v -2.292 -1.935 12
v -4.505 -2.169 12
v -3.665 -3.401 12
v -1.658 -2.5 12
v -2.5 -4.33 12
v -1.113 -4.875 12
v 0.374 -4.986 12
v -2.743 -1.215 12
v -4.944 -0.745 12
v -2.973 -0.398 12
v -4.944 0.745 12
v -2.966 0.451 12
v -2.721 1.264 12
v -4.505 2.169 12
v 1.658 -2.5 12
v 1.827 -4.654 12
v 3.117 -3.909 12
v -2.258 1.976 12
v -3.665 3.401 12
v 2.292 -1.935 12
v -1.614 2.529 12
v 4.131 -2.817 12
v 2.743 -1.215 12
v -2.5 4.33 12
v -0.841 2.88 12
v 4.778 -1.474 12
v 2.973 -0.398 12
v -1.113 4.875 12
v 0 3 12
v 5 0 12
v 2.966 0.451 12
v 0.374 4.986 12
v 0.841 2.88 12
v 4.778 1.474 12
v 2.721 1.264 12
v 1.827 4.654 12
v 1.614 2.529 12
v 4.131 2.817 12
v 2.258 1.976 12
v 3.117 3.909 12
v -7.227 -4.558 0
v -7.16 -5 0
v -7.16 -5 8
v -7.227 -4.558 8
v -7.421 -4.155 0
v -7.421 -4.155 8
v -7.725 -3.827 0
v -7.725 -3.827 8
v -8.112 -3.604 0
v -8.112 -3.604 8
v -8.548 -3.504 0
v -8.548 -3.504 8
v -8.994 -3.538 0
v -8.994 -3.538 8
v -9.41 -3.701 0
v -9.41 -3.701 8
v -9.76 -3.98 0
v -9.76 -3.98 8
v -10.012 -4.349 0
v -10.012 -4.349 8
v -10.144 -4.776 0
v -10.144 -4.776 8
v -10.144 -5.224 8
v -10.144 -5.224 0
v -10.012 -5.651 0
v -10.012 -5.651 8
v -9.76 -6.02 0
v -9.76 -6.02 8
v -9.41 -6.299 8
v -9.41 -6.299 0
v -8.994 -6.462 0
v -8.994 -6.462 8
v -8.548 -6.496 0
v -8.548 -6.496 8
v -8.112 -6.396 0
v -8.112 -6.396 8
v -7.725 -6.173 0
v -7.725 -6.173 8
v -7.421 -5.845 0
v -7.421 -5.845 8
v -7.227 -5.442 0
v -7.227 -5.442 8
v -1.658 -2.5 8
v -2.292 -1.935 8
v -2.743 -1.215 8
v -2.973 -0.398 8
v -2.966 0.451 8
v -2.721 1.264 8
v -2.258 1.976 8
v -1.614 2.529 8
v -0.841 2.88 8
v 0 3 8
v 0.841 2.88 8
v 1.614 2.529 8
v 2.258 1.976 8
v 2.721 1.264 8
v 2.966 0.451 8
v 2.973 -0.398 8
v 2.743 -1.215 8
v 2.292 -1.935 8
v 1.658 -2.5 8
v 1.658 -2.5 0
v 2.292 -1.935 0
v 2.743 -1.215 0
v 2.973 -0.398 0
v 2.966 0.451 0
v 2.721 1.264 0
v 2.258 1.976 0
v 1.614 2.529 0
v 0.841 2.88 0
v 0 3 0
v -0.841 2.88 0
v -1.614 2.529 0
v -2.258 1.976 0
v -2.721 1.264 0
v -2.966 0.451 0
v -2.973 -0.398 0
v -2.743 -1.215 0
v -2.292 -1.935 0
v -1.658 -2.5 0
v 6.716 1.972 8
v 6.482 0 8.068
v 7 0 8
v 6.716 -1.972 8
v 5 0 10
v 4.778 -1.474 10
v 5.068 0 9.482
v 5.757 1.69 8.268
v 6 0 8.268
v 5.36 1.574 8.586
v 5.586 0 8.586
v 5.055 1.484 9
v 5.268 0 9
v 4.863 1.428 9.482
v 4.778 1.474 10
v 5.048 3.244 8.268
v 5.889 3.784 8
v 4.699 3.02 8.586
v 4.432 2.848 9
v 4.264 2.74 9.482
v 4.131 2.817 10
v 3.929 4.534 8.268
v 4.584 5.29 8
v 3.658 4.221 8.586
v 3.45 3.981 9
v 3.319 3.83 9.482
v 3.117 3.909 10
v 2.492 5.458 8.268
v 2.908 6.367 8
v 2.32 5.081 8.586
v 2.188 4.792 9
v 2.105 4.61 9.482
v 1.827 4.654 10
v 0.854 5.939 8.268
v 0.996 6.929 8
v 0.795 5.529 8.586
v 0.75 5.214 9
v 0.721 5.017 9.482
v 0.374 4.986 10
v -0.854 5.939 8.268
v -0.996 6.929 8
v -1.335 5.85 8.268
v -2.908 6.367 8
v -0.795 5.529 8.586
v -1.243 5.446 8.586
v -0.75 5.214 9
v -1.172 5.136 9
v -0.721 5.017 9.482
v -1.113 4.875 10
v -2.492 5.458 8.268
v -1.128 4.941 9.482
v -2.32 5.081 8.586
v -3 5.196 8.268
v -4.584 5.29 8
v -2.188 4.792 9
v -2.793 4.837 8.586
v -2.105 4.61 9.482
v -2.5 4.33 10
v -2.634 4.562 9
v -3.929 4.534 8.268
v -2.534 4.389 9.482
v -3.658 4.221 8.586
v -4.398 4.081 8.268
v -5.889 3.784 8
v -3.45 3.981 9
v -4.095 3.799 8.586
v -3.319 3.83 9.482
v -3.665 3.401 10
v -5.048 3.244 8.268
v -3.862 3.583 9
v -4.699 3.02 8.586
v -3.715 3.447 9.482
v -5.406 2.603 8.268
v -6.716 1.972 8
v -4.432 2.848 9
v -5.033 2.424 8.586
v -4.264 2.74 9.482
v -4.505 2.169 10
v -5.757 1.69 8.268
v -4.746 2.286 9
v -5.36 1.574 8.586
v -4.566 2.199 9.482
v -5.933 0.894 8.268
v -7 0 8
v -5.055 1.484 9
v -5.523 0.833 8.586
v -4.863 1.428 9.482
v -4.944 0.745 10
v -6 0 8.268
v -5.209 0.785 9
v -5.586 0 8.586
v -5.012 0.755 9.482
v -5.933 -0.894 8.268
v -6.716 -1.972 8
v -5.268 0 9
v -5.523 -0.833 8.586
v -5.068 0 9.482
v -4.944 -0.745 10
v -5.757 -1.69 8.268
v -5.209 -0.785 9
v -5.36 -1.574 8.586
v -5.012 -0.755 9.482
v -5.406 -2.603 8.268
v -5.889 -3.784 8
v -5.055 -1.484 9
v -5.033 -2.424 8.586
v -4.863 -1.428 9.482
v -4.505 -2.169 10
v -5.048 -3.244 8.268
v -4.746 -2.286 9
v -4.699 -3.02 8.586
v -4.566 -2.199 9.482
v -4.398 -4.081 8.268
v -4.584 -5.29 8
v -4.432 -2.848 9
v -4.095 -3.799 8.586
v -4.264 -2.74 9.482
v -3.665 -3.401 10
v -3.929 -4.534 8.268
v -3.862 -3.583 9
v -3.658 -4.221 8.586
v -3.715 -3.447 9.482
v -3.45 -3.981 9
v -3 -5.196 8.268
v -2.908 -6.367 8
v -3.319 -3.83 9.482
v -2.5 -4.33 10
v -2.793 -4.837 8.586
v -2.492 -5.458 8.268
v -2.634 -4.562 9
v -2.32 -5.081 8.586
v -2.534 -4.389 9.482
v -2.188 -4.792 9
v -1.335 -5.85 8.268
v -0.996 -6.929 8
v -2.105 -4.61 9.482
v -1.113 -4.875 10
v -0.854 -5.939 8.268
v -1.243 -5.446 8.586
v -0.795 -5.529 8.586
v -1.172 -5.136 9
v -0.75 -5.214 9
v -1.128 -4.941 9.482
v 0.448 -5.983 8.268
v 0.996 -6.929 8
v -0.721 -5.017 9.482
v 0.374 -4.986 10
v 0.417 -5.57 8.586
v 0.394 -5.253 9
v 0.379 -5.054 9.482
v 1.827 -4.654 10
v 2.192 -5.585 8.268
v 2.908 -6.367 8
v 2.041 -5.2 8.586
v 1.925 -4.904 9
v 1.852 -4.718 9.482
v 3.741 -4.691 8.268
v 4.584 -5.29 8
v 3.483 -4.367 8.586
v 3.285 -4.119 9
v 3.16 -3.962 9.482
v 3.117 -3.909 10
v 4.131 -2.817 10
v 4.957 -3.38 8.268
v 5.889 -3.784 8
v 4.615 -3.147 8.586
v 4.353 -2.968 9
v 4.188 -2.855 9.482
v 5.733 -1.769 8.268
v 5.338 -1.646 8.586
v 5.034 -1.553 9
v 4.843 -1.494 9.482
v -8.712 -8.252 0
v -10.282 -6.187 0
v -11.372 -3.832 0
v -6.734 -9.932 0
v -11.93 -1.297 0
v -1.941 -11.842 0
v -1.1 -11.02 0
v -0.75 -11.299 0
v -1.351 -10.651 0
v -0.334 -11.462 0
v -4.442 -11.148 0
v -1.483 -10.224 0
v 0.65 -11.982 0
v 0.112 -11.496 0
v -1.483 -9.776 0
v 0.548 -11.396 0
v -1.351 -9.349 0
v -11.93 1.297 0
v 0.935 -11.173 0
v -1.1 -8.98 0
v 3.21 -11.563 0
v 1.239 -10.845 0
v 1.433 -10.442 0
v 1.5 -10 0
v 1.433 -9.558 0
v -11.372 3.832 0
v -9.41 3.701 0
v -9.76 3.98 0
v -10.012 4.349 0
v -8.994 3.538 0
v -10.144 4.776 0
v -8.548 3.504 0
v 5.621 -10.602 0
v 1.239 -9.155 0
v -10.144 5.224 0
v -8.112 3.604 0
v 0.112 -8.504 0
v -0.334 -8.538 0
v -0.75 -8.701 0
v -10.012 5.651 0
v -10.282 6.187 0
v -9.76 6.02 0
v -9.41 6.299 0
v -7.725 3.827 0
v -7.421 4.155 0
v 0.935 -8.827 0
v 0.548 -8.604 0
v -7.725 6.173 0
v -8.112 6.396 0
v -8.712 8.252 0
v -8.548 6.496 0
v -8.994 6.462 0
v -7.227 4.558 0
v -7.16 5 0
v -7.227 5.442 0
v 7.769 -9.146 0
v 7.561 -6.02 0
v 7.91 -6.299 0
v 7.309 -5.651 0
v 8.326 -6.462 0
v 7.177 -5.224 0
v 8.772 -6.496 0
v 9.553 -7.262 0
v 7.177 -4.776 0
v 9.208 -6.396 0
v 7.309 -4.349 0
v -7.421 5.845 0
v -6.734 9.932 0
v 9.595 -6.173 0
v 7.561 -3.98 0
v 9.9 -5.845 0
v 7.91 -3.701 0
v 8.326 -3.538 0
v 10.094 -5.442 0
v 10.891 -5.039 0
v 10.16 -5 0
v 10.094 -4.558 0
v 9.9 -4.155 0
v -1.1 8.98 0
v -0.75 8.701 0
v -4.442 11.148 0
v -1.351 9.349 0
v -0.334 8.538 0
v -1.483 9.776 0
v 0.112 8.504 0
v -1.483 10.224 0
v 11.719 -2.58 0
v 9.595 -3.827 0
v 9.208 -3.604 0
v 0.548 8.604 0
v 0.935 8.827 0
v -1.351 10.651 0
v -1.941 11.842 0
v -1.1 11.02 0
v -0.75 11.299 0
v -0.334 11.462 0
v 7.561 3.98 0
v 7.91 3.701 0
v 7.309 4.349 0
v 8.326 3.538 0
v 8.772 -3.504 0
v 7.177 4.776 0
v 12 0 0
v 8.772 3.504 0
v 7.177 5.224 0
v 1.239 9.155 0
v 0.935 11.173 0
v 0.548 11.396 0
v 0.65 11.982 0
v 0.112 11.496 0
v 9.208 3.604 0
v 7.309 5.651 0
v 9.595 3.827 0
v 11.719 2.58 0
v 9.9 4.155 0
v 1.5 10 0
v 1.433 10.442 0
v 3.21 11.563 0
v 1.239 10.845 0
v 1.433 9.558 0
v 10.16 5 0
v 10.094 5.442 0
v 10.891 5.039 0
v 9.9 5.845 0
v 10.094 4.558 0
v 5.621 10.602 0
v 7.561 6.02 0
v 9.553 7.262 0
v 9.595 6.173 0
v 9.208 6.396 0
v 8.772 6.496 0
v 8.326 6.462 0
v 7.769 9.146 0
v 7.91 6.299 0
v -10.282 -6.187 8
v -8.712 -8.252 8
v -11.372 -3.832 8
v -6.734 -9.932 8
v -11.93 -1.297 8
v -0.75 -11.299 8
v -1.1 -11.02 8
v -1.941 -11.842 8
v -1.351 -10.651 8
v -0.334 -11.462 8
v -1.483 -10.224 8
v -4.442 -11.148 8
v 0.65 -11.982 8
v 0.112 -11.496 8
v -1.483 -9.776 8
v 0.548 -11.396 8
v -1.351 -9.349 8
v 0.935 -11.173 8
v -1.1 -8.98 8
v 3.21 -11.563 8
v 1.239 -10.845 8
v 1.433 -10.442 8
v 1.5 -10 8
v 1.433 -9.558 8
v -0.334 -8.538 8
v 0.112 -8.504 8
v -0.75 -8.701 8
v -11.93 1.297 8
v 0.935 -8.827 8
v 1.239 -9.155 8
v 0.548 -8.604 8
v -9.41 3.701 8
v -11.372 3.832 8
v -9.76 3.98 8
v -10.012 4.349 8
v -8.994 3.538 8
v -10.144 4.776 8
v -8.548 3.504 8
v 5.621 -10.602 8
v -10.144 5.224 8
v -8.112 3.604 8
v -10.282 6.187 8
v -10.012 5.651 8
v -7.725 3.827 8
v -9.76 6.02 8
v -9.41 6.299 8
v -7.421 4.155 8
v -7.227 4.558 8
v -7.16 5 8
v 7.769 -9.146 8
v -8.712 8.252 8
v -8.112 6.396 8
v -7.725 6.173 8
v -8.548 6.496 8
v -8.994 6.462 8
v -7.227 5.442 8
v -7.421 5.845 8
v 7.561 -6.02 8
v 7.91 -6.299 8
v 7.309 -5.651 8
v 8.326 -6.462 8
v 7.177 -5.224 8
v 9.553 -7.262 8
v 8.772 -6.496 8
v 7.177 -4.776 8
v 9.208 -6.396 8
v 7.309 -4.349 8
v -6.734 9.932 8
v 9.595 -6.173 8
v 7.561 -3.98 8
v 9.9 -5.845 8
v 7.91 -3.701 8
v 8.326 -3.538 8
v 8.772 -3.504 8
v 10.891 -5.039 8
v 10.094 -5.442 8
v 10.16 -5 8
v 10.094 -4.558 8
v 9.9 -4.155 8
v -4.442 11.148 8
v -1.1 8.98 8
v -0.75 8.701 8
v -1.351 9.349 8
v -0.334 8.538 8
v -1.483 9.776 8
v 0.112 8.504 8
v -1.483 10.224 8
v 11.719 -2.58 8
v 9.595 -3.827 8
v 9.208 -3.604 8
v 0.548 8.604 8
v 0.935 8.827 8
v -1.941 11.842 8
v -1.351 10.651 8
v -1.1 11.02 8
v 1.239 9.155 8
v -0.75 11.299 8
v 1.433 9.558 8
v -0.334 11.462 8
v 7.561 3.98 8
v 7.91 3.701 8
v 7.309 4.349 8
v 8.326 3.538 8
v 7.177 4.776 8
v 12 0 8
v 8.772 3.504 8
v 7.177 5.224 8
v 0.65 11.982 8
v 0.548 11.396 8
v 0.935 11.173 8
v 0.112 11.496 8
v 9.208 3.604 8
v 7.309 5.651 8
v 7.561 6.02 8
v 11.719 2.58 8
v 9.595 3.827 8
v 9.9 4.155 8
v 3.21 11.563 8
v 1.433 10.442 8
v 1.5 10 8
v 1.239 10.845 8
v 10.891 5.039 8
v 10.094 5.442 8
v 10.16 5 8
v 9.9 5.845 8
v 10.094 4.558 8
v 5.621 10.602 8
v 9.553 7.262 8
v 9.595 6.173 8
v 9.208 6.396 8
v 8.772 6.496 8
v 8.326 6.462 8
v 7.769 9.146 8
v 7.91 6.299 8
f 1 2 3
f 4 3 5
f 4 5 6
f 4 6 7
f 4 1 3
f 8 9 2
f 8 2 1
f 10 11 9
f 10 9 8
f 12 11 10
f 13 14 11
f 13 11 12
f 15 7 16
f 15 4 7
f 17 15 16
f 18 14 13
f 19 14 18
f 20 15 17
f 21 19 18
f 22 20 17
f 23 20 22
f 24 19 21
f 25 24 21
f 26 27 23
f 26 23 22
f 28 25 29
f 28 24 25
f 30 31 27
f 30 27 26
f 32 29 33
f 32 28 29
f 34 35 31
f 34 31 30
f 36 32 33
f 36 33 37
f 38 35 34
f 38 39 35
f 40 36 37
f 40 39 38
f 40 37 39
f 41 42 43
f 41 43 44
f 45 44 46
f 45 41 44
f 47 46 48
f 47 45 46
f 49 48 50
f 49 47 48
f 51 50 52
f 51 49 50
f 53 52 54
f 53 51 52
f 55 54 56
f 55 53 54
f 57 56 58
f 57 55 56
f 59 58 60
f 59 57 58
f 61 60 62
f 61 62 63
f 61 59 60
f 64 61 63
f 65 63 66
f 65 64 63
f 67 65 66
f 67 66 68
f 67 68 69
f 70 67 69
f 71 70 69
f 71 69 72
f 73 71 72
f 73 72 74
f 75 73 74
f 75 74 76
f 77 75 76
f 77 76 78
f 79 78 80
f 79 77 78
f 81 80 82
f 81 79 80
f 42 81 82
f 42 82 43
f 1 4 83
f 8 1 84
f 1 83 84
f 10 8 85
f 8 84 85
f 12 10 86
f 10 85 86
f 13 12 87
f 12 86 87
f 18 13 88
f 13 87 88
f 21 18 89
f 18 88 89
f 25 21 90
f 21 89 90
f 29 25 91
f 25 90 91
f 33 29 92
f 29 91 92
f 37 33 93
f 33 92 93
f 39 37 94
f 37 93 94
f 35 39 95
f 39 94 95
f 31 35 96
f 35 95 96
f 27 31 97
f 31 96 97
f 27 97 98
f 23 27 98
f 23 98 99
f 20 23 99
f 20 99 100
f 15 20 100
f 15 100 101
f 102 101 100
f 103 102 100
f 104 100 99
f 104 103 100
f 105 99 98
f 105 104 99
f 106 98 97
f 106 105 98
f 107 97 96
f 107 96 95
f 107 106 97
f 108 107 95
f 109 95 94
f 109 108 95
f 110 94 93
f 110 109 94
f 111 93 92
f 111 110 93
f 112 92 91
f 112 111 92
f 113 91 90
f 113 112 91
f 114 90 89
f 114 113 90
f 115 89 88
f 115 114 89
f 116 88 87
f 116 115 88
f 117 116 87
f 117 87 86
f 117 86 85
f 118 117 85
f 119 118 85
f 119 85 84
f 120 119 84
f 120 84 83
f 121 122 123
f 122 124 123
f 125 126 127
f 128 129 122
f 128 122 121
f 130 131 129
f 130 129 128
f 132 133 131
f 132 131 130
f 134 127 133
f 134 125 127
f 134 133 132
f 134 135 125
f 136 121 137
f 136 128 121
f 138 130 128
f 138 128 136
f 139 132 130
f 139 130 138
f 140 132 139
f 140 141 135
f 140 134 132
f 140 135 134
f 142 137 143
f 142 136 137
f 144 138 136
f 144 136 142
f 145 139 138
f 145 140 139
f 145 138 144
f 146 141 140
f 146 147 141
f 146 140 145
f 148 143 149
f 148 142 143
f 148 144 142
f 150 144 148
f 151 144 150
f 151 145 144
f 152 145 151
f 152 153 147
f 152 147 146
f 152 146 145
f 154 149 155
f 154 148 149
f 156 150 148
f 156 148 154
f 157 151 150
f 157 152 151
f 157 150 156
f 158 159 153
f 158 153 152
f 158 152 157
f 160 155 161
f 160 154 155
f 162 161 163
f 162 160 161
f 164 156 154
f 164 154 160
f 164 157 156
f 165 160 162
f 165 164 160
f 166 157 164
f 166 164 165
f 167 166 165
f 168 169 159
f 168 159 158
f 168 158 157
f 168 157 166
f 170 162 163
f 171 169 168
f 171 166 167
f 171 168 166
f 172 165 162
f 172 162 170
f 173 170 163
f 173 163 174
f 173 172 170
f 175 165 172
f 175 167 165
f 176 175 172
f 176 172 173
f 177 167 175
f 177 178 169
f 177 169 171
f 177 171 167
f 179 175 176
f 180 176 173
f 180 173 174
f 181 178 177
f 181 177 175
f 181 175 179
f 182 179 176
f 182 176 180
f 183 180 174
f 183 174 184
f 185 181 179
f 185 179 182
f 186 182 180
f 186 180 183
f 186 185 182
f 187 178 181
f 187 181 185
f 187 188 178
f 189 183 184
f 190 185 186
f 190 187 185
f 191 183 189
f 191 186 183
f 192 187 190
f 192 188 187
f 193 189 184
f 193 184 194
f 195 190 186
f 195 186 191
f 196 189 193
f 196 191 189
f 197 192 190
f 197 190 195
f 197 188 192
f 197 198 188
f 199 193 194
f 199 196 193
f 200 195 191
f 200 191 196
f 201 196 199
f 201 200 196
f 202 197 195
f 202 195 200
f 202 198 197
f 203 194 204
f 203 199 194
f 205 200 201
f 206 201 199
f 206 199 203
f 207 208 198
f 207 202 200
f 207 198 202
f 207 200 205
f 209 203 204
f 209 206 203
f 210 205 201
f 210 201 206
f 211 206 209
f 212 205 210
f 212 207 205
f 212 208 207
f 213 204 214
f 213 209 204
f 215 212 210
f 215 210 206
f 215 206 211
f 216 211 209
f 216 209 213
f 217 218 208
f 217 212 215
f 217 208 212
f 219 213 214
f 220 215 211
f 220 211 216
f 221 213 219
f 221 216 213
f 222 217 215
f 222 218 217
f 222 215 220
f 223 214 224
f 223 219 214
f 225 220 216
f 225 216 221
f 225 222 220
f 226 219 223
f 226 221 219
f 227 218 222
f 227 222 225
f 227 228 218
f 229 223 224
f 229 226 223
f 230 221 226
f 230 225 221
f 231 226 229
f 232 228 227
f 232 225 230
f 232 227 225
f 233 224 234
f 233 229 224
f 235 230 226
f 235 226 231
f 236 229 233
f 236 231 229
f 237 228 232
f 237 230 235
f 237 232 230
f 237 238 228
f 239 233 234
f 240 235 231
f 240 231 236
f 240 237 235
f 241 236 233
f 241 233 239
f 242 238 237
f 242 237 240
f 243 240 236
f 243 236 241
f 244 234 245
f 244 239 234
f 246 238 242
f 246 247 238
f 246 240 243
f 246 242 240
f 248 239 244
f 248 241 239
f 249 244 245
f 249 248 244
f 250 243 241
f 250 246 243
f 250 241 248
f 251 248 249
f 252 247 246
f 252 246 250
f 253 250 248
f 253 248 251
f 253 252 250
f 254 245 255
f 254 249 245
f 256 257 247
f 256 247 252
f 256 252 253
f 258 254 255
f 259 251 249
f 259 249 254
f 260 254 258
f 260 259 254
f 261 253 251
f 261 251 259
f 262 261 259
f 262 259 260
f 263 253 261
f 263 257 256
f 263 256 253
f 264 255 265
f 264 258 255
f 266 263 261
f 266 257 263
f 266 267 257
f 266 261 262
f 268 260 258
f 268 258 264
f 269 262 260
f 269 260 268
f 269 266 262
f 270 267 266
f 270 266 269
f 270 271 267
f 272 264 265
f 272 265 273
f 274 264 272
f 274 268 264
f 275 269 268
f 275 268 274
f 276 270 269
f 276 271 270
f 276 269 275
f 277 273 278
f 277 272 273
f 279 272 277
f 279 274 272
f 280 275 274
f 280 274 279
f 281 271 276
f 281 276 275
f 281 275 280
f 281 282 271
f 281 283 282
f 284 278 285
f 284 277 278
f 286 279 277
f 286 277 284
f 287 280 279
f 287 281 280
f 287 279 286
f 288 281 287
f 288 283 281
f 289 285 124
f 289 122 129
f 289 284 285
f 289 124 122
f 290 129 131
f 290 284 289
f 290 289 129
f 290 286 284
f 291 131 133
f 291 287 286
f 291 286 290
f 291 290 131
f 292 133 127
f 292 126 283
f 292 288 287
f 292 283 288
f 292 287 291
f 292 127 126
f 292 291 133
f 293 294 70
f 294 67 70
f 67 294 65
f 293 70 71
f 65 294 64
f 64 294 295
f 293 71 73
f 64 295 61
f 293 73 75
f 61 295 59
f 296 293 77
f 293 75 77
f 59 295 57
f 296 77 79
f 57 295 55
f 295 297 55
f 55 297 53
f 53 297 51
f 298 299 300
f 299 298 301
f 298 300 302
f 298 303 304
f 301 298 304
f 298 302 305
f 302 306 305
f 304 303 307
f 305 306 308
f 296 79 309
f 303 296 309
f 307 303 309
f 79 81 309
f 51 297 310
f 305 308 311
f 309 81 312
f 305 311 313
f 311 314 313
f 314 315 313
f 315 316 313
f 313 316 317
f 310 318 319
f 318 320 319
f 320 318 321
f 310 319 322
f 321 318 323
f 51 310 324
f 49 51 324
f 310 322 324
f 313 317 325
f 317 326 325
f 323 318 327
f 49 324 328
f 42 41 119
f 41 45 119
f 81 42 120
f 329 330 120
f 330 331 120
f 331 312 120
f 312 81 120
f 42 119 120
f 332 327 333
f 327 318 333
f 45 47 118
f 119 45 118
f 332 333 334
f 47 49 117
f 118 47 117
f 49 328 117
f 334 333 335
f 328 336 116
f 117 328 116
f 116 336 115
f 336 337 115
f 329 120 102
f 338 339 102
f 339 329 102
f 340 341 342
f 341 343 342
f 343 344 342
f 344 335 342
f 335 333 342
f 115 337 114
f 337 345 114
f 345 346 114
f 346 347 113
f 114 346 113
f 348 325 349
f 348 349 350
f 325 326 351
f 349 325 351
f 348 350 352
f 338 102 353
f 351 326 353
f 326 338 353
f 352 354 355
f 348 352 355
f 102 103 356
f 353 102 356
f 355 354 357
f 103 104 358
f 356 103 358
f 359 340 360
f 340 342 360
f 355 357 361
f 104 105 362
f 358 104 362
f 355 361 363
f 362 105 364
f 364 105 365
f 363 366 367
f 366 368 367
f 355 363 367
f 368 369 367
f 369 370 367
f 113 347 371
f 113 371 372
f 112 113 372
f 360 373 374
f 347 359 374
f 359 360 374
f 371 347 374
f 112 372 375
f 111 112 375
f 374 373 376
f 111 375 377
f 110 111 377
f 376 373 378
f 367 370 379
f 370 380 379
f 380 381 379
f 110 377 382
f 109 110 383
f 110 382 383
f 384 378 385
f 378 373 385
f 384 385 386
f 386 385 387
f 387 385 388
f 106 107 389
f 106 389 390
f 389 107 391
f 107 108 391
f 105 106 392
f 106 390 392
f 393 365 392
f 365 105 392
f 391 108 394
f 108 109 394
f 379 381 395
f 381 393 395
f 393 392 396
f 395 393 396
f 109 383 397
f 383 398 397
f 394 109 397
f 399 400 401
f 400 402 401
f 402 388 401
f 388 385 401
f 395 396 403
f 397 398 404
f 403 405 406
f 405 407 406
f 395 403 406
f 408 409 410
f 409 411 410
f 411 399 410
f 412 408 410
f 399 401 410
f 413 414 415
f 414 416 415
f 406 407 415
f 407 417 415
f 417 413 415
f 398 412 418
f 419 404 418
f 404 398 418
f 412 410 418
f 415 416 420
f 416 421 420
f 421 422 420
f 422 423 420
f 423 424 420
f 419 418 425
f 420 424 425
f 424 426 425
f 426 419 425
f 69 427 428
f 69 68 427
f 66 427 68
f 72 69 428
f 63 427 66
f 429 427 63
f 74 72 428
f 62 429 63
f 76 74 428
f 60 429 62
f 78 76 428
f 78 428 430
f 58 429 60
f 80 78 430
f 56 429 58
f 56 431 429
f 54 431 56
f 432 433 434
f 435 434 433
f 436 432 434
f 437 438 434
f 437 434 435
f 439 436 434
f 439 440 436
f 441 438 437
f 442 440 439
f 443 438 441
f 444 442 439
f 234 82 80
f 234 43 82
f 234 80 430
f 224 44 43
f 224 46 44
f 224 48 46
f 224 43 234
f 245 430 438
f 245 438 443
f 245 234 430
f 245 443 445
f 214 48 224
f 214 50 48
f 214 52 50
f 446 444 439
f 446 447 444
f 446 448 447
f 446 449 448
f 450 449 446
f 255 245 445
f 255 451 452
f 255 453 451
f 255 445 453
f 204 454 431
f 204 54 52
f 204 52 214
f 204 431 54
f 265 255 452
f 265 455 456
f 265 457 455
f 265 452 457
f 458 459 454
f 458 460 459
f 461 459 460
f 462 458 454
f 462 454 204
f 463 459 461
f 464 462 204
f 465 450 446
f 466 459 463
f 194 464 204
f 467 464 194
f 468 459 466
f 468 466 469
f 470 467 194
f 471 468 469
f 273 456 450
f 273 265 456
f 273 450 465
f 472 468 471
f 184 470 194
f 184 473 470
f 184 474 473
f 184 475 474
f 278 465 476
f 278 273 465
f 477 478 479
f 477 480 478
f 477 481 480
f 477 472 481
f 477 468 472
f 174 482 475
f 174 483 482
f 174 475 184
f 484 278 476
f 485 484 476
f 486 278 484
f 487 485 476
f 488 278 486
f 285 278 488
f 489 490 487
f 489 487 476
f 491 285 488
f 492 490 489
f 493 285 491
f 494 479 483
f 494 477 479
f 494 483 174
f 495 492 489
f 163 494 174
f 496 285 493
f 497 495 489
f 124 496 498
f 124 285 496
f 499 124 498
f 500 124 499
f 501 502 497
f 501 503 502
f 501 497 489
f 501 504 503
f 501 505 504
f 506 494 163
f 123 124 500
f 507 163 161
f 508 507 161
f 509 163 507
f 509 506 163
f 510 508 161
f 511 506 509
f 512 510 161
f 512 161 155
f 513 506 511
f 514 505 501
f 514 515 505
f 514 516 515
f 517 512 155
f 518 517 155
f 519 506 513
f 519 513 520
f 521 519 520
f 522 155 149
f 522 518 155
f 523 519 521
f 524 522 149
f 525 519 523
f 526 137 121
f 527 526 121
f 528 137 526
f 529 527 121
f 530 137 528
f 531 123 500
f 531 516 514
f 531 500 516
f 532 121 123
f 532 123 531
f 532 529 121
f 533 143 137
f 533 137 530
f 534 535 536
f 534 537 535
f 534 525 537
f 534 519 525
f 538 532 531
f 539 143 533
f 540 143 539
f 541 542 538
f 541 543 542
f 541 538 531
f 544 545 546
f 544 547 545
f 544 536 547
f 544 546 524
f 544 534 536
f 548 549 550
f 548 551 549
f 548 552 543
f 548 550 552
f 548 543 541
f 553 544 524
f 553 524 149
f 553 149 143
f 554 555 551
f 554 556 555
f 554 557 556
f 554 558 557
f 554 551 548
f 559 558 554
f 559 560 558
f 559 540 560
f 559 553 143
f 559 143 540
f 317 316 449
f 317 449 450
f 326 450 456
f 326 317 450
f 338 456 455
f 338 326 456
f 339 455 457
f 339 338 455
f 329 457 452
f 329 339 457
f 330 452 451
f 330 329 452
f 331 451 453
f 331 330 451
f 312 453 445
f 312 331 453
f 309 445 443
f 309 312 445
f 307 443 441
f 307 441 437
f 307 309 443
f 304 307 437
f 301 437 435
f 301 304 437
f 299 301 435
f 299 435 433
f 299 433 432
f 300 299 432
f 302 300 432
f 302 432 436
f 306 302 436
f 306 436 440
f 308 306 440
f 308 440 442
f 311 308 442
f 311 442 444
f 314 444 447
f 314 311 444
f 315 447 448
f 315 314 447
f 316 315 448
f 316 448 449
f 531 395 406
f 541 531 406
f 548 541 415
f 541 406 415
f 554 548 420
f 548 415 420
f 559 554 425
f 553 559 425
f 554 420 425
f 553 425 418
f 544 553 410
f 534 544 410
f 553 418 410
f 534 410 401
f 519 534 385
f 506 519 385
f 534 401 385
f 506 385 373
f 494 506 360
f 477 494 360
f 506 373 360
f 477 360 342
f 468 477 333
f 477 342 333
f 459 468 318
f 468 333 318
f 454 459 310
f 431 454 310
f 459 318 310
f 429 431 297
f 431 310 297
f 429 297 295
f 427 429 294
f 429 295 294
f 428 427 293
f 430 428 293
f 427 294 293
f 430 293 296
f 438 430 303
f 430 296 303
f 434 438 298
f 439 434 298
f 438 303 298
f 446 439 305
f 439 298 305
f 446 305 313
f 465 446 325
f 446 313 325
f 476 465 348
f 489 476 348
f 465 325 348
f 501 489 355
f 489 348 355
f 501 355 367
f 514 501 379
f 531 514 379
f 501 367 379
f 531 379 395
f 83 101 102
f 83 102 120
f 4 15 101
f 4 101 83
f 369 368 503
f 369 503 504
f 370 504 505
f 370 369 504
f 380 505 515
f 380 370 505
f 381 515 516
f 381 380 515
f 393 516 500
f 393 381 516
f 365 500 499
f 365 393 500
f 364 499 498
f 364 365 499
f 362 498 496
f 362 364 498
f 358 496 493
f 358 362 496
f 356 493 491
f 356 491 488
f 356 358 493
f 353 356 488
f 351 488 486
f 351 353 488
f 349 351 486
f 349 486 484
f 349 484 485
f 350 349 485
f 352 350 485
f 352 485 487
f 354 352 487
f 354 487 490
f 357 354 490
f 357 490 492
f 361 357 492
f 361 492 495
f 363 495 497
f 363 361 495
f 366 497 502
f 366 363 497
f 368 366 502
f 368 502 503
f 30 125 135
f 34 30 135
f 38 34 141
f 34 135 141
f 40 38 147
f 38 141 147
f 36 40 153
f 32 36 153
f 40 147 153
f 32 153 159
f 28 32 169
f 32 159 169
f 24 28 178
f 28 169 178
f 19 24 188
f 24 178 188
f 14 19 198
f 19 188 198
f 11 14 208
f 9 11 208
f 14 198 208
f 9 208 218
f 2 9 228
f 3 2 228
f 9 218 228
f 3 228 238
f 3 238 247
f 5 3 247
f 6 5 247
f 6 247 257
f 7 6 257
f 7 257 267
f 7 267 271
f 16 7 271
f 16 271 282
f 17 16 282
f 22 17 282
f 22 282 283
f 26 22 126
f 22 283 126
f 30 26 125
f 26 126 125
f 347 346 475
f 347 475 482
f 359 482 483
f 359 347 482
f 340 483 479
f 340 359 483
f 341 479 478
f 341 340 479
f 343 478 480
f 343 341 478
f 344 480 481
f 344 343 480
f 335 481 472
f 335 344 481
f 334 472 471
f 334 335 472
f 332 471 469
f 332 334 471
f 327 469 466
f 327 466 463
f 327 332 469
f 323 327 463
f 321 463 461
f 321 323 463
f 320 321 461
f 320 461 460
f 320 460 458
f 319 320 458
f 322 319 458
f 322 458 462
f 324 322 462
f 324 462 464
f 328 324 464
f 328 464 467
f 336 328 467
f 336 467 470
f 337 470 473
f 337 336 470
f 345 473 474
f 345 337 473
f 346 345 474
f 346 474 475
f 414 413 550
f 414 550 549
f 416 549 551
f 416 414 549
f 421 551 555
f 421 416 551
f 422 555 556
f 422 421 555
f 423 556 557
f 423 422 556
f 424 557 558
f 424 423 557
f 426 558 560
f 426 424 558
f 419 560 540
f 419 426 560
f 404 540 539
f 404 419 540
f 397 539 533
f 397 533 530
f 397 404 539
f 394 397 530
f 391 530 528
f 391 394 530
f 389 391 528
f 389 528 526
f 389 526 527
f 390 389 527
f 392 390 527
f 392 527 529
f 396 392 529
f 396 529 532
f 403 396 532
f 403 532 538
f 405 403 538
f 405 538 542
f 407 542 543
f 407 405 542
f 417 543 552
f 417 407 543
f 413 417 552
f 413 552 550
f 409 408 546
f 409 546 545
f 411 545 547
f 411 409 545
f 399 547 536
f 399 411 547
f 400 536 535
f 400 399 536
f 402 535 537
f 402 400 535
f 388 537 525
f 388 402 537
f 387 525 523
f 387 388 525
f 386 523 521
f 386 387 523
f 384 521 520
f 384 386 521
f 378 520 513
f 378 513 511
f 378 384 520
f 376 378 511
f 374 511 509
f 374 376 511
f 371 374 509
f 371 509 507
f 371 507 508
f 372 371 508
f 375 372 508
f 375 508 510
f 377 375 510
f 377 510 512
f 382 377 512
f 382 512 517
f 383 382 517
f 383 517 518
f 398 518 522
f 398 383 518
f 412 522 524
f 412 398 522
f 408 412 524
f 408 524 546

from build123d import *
from build123d.topology import SkipClean

# Parameters (mm, degrees)
SKETCH1_R                       = 12
SKETCH1_R_2                     = 1.5
SKETCH1_R_3                     = 3
BOSS_EXTRUDE1_DEPTH             = 8
SKETCH2_R                       = 5
BOSS_EXTRUDE2_DEPTH             = 4
BOSS_EXTRUDE2_DIRECTION_2_REACH = 20.762
FILLET1_R                       = 2


with BuildPart() as part:
    # Sketch1 → Boss-Extrude1 (new body)
    with BuildSketch(Plane.XY):
        Circle(SKETCH1_R)
        with Locations((0, 10)):
            Circle(SKETCH1_R_2, mode=Mode.SUBTRACT)
        Circle(SKETCH1_R_3, mode=Mode.SUBTRACT)
        with Locations((8.660254038, 5)):
            Circle(SKETCH1_R_2, mode=Mode.SUBTRACT)
        with Locations((8.660254038, -5)):
            Circle(SKETCH1_R_2, mode=Mode.SUBTRACT)
        with Locations((0, -10)):
            Circle(SKETCH1_R_2, mode=Mode.SUBTRACT)
        with Locations((-8.660254038, -5)):
            Circle(SKETCH1_R_2, mode=Mode.SUBTRACT)
        with Locations((-8.660254038, 5)):
            Circle(SKETCH1_R_2, mode=Mode.SUBTRACT)
    extrude(amount=BOSS_EXTRUDE1_DEPTH)

    # Sketch2 → Boss-Extrude2 (add)
    with SkipClean():  # the faces are left unmerged after this step: merging them gives an invalid solid
        with BuildSketch(Plane.XY.offset(8)):
            Circle(SKETCH2_R)
            with BuildLine():
                Line((1.658312395, -2.5), (-1.658312395, -2.5))
                ThreePointArc((-1.658312395, -2.5), (0, 3), (1.658312395, -2.5))
            make_face(mode=Mode.SUBTRACT)
        extrude(amount=BOSS_EXTRUDE2_DEPTH)

    # Boss-Extrude2 direction 2: up to this face of the body (flat: up to its plane)
    boss_extrude2_direction_2_end = Plane(part.part.faces().sort_by_distance((-11.660588745, 0, 0))[0])
    # Sketch2 → Boss-Extrude2 direction 2 (add, up to the picked face)
    with BuildSketch(Plane.XY.offset(8), mode=Mode.PRIVATE) as boss_extrude2_direction_2_sk1:
        Circle(SKETCH2_R)
        with BuildLine():
            Line((1.658312395, -2.5), (-1.658312395, -2.5))
            ThreePointArc((-1.658312395, -2.5), (0, 3), (1.658312395, -2.5))
        make_face(mode=Mode.SUBTRACT)
    boss_extrude2_direction_2_tool1 = split(extrude(boss_extrude2_direction_2_sk1.sketch, amount=-BOSS_EXTRUDE2_DIRECTION_2_REACH, mode=Mode.PRIVATE), bisect_by=boss_extrude2_direction_2_end, keep=Keep.BOTH, mode=Mode.PRIVATE)
    add(boss_extrude2_direction_2_tool1.solids().sort_by(Axis((-4.858579, 0, 8), (0, 0, -1)))[0])

    # Fillet1
    fillet1_edges = [part.edges().sort_by_distance(p)[0] for p in [
        (-5, 0, 8),
    ]]
    fillet(fillet1_edges, radius=FILLET1_R)


solid = part.part
